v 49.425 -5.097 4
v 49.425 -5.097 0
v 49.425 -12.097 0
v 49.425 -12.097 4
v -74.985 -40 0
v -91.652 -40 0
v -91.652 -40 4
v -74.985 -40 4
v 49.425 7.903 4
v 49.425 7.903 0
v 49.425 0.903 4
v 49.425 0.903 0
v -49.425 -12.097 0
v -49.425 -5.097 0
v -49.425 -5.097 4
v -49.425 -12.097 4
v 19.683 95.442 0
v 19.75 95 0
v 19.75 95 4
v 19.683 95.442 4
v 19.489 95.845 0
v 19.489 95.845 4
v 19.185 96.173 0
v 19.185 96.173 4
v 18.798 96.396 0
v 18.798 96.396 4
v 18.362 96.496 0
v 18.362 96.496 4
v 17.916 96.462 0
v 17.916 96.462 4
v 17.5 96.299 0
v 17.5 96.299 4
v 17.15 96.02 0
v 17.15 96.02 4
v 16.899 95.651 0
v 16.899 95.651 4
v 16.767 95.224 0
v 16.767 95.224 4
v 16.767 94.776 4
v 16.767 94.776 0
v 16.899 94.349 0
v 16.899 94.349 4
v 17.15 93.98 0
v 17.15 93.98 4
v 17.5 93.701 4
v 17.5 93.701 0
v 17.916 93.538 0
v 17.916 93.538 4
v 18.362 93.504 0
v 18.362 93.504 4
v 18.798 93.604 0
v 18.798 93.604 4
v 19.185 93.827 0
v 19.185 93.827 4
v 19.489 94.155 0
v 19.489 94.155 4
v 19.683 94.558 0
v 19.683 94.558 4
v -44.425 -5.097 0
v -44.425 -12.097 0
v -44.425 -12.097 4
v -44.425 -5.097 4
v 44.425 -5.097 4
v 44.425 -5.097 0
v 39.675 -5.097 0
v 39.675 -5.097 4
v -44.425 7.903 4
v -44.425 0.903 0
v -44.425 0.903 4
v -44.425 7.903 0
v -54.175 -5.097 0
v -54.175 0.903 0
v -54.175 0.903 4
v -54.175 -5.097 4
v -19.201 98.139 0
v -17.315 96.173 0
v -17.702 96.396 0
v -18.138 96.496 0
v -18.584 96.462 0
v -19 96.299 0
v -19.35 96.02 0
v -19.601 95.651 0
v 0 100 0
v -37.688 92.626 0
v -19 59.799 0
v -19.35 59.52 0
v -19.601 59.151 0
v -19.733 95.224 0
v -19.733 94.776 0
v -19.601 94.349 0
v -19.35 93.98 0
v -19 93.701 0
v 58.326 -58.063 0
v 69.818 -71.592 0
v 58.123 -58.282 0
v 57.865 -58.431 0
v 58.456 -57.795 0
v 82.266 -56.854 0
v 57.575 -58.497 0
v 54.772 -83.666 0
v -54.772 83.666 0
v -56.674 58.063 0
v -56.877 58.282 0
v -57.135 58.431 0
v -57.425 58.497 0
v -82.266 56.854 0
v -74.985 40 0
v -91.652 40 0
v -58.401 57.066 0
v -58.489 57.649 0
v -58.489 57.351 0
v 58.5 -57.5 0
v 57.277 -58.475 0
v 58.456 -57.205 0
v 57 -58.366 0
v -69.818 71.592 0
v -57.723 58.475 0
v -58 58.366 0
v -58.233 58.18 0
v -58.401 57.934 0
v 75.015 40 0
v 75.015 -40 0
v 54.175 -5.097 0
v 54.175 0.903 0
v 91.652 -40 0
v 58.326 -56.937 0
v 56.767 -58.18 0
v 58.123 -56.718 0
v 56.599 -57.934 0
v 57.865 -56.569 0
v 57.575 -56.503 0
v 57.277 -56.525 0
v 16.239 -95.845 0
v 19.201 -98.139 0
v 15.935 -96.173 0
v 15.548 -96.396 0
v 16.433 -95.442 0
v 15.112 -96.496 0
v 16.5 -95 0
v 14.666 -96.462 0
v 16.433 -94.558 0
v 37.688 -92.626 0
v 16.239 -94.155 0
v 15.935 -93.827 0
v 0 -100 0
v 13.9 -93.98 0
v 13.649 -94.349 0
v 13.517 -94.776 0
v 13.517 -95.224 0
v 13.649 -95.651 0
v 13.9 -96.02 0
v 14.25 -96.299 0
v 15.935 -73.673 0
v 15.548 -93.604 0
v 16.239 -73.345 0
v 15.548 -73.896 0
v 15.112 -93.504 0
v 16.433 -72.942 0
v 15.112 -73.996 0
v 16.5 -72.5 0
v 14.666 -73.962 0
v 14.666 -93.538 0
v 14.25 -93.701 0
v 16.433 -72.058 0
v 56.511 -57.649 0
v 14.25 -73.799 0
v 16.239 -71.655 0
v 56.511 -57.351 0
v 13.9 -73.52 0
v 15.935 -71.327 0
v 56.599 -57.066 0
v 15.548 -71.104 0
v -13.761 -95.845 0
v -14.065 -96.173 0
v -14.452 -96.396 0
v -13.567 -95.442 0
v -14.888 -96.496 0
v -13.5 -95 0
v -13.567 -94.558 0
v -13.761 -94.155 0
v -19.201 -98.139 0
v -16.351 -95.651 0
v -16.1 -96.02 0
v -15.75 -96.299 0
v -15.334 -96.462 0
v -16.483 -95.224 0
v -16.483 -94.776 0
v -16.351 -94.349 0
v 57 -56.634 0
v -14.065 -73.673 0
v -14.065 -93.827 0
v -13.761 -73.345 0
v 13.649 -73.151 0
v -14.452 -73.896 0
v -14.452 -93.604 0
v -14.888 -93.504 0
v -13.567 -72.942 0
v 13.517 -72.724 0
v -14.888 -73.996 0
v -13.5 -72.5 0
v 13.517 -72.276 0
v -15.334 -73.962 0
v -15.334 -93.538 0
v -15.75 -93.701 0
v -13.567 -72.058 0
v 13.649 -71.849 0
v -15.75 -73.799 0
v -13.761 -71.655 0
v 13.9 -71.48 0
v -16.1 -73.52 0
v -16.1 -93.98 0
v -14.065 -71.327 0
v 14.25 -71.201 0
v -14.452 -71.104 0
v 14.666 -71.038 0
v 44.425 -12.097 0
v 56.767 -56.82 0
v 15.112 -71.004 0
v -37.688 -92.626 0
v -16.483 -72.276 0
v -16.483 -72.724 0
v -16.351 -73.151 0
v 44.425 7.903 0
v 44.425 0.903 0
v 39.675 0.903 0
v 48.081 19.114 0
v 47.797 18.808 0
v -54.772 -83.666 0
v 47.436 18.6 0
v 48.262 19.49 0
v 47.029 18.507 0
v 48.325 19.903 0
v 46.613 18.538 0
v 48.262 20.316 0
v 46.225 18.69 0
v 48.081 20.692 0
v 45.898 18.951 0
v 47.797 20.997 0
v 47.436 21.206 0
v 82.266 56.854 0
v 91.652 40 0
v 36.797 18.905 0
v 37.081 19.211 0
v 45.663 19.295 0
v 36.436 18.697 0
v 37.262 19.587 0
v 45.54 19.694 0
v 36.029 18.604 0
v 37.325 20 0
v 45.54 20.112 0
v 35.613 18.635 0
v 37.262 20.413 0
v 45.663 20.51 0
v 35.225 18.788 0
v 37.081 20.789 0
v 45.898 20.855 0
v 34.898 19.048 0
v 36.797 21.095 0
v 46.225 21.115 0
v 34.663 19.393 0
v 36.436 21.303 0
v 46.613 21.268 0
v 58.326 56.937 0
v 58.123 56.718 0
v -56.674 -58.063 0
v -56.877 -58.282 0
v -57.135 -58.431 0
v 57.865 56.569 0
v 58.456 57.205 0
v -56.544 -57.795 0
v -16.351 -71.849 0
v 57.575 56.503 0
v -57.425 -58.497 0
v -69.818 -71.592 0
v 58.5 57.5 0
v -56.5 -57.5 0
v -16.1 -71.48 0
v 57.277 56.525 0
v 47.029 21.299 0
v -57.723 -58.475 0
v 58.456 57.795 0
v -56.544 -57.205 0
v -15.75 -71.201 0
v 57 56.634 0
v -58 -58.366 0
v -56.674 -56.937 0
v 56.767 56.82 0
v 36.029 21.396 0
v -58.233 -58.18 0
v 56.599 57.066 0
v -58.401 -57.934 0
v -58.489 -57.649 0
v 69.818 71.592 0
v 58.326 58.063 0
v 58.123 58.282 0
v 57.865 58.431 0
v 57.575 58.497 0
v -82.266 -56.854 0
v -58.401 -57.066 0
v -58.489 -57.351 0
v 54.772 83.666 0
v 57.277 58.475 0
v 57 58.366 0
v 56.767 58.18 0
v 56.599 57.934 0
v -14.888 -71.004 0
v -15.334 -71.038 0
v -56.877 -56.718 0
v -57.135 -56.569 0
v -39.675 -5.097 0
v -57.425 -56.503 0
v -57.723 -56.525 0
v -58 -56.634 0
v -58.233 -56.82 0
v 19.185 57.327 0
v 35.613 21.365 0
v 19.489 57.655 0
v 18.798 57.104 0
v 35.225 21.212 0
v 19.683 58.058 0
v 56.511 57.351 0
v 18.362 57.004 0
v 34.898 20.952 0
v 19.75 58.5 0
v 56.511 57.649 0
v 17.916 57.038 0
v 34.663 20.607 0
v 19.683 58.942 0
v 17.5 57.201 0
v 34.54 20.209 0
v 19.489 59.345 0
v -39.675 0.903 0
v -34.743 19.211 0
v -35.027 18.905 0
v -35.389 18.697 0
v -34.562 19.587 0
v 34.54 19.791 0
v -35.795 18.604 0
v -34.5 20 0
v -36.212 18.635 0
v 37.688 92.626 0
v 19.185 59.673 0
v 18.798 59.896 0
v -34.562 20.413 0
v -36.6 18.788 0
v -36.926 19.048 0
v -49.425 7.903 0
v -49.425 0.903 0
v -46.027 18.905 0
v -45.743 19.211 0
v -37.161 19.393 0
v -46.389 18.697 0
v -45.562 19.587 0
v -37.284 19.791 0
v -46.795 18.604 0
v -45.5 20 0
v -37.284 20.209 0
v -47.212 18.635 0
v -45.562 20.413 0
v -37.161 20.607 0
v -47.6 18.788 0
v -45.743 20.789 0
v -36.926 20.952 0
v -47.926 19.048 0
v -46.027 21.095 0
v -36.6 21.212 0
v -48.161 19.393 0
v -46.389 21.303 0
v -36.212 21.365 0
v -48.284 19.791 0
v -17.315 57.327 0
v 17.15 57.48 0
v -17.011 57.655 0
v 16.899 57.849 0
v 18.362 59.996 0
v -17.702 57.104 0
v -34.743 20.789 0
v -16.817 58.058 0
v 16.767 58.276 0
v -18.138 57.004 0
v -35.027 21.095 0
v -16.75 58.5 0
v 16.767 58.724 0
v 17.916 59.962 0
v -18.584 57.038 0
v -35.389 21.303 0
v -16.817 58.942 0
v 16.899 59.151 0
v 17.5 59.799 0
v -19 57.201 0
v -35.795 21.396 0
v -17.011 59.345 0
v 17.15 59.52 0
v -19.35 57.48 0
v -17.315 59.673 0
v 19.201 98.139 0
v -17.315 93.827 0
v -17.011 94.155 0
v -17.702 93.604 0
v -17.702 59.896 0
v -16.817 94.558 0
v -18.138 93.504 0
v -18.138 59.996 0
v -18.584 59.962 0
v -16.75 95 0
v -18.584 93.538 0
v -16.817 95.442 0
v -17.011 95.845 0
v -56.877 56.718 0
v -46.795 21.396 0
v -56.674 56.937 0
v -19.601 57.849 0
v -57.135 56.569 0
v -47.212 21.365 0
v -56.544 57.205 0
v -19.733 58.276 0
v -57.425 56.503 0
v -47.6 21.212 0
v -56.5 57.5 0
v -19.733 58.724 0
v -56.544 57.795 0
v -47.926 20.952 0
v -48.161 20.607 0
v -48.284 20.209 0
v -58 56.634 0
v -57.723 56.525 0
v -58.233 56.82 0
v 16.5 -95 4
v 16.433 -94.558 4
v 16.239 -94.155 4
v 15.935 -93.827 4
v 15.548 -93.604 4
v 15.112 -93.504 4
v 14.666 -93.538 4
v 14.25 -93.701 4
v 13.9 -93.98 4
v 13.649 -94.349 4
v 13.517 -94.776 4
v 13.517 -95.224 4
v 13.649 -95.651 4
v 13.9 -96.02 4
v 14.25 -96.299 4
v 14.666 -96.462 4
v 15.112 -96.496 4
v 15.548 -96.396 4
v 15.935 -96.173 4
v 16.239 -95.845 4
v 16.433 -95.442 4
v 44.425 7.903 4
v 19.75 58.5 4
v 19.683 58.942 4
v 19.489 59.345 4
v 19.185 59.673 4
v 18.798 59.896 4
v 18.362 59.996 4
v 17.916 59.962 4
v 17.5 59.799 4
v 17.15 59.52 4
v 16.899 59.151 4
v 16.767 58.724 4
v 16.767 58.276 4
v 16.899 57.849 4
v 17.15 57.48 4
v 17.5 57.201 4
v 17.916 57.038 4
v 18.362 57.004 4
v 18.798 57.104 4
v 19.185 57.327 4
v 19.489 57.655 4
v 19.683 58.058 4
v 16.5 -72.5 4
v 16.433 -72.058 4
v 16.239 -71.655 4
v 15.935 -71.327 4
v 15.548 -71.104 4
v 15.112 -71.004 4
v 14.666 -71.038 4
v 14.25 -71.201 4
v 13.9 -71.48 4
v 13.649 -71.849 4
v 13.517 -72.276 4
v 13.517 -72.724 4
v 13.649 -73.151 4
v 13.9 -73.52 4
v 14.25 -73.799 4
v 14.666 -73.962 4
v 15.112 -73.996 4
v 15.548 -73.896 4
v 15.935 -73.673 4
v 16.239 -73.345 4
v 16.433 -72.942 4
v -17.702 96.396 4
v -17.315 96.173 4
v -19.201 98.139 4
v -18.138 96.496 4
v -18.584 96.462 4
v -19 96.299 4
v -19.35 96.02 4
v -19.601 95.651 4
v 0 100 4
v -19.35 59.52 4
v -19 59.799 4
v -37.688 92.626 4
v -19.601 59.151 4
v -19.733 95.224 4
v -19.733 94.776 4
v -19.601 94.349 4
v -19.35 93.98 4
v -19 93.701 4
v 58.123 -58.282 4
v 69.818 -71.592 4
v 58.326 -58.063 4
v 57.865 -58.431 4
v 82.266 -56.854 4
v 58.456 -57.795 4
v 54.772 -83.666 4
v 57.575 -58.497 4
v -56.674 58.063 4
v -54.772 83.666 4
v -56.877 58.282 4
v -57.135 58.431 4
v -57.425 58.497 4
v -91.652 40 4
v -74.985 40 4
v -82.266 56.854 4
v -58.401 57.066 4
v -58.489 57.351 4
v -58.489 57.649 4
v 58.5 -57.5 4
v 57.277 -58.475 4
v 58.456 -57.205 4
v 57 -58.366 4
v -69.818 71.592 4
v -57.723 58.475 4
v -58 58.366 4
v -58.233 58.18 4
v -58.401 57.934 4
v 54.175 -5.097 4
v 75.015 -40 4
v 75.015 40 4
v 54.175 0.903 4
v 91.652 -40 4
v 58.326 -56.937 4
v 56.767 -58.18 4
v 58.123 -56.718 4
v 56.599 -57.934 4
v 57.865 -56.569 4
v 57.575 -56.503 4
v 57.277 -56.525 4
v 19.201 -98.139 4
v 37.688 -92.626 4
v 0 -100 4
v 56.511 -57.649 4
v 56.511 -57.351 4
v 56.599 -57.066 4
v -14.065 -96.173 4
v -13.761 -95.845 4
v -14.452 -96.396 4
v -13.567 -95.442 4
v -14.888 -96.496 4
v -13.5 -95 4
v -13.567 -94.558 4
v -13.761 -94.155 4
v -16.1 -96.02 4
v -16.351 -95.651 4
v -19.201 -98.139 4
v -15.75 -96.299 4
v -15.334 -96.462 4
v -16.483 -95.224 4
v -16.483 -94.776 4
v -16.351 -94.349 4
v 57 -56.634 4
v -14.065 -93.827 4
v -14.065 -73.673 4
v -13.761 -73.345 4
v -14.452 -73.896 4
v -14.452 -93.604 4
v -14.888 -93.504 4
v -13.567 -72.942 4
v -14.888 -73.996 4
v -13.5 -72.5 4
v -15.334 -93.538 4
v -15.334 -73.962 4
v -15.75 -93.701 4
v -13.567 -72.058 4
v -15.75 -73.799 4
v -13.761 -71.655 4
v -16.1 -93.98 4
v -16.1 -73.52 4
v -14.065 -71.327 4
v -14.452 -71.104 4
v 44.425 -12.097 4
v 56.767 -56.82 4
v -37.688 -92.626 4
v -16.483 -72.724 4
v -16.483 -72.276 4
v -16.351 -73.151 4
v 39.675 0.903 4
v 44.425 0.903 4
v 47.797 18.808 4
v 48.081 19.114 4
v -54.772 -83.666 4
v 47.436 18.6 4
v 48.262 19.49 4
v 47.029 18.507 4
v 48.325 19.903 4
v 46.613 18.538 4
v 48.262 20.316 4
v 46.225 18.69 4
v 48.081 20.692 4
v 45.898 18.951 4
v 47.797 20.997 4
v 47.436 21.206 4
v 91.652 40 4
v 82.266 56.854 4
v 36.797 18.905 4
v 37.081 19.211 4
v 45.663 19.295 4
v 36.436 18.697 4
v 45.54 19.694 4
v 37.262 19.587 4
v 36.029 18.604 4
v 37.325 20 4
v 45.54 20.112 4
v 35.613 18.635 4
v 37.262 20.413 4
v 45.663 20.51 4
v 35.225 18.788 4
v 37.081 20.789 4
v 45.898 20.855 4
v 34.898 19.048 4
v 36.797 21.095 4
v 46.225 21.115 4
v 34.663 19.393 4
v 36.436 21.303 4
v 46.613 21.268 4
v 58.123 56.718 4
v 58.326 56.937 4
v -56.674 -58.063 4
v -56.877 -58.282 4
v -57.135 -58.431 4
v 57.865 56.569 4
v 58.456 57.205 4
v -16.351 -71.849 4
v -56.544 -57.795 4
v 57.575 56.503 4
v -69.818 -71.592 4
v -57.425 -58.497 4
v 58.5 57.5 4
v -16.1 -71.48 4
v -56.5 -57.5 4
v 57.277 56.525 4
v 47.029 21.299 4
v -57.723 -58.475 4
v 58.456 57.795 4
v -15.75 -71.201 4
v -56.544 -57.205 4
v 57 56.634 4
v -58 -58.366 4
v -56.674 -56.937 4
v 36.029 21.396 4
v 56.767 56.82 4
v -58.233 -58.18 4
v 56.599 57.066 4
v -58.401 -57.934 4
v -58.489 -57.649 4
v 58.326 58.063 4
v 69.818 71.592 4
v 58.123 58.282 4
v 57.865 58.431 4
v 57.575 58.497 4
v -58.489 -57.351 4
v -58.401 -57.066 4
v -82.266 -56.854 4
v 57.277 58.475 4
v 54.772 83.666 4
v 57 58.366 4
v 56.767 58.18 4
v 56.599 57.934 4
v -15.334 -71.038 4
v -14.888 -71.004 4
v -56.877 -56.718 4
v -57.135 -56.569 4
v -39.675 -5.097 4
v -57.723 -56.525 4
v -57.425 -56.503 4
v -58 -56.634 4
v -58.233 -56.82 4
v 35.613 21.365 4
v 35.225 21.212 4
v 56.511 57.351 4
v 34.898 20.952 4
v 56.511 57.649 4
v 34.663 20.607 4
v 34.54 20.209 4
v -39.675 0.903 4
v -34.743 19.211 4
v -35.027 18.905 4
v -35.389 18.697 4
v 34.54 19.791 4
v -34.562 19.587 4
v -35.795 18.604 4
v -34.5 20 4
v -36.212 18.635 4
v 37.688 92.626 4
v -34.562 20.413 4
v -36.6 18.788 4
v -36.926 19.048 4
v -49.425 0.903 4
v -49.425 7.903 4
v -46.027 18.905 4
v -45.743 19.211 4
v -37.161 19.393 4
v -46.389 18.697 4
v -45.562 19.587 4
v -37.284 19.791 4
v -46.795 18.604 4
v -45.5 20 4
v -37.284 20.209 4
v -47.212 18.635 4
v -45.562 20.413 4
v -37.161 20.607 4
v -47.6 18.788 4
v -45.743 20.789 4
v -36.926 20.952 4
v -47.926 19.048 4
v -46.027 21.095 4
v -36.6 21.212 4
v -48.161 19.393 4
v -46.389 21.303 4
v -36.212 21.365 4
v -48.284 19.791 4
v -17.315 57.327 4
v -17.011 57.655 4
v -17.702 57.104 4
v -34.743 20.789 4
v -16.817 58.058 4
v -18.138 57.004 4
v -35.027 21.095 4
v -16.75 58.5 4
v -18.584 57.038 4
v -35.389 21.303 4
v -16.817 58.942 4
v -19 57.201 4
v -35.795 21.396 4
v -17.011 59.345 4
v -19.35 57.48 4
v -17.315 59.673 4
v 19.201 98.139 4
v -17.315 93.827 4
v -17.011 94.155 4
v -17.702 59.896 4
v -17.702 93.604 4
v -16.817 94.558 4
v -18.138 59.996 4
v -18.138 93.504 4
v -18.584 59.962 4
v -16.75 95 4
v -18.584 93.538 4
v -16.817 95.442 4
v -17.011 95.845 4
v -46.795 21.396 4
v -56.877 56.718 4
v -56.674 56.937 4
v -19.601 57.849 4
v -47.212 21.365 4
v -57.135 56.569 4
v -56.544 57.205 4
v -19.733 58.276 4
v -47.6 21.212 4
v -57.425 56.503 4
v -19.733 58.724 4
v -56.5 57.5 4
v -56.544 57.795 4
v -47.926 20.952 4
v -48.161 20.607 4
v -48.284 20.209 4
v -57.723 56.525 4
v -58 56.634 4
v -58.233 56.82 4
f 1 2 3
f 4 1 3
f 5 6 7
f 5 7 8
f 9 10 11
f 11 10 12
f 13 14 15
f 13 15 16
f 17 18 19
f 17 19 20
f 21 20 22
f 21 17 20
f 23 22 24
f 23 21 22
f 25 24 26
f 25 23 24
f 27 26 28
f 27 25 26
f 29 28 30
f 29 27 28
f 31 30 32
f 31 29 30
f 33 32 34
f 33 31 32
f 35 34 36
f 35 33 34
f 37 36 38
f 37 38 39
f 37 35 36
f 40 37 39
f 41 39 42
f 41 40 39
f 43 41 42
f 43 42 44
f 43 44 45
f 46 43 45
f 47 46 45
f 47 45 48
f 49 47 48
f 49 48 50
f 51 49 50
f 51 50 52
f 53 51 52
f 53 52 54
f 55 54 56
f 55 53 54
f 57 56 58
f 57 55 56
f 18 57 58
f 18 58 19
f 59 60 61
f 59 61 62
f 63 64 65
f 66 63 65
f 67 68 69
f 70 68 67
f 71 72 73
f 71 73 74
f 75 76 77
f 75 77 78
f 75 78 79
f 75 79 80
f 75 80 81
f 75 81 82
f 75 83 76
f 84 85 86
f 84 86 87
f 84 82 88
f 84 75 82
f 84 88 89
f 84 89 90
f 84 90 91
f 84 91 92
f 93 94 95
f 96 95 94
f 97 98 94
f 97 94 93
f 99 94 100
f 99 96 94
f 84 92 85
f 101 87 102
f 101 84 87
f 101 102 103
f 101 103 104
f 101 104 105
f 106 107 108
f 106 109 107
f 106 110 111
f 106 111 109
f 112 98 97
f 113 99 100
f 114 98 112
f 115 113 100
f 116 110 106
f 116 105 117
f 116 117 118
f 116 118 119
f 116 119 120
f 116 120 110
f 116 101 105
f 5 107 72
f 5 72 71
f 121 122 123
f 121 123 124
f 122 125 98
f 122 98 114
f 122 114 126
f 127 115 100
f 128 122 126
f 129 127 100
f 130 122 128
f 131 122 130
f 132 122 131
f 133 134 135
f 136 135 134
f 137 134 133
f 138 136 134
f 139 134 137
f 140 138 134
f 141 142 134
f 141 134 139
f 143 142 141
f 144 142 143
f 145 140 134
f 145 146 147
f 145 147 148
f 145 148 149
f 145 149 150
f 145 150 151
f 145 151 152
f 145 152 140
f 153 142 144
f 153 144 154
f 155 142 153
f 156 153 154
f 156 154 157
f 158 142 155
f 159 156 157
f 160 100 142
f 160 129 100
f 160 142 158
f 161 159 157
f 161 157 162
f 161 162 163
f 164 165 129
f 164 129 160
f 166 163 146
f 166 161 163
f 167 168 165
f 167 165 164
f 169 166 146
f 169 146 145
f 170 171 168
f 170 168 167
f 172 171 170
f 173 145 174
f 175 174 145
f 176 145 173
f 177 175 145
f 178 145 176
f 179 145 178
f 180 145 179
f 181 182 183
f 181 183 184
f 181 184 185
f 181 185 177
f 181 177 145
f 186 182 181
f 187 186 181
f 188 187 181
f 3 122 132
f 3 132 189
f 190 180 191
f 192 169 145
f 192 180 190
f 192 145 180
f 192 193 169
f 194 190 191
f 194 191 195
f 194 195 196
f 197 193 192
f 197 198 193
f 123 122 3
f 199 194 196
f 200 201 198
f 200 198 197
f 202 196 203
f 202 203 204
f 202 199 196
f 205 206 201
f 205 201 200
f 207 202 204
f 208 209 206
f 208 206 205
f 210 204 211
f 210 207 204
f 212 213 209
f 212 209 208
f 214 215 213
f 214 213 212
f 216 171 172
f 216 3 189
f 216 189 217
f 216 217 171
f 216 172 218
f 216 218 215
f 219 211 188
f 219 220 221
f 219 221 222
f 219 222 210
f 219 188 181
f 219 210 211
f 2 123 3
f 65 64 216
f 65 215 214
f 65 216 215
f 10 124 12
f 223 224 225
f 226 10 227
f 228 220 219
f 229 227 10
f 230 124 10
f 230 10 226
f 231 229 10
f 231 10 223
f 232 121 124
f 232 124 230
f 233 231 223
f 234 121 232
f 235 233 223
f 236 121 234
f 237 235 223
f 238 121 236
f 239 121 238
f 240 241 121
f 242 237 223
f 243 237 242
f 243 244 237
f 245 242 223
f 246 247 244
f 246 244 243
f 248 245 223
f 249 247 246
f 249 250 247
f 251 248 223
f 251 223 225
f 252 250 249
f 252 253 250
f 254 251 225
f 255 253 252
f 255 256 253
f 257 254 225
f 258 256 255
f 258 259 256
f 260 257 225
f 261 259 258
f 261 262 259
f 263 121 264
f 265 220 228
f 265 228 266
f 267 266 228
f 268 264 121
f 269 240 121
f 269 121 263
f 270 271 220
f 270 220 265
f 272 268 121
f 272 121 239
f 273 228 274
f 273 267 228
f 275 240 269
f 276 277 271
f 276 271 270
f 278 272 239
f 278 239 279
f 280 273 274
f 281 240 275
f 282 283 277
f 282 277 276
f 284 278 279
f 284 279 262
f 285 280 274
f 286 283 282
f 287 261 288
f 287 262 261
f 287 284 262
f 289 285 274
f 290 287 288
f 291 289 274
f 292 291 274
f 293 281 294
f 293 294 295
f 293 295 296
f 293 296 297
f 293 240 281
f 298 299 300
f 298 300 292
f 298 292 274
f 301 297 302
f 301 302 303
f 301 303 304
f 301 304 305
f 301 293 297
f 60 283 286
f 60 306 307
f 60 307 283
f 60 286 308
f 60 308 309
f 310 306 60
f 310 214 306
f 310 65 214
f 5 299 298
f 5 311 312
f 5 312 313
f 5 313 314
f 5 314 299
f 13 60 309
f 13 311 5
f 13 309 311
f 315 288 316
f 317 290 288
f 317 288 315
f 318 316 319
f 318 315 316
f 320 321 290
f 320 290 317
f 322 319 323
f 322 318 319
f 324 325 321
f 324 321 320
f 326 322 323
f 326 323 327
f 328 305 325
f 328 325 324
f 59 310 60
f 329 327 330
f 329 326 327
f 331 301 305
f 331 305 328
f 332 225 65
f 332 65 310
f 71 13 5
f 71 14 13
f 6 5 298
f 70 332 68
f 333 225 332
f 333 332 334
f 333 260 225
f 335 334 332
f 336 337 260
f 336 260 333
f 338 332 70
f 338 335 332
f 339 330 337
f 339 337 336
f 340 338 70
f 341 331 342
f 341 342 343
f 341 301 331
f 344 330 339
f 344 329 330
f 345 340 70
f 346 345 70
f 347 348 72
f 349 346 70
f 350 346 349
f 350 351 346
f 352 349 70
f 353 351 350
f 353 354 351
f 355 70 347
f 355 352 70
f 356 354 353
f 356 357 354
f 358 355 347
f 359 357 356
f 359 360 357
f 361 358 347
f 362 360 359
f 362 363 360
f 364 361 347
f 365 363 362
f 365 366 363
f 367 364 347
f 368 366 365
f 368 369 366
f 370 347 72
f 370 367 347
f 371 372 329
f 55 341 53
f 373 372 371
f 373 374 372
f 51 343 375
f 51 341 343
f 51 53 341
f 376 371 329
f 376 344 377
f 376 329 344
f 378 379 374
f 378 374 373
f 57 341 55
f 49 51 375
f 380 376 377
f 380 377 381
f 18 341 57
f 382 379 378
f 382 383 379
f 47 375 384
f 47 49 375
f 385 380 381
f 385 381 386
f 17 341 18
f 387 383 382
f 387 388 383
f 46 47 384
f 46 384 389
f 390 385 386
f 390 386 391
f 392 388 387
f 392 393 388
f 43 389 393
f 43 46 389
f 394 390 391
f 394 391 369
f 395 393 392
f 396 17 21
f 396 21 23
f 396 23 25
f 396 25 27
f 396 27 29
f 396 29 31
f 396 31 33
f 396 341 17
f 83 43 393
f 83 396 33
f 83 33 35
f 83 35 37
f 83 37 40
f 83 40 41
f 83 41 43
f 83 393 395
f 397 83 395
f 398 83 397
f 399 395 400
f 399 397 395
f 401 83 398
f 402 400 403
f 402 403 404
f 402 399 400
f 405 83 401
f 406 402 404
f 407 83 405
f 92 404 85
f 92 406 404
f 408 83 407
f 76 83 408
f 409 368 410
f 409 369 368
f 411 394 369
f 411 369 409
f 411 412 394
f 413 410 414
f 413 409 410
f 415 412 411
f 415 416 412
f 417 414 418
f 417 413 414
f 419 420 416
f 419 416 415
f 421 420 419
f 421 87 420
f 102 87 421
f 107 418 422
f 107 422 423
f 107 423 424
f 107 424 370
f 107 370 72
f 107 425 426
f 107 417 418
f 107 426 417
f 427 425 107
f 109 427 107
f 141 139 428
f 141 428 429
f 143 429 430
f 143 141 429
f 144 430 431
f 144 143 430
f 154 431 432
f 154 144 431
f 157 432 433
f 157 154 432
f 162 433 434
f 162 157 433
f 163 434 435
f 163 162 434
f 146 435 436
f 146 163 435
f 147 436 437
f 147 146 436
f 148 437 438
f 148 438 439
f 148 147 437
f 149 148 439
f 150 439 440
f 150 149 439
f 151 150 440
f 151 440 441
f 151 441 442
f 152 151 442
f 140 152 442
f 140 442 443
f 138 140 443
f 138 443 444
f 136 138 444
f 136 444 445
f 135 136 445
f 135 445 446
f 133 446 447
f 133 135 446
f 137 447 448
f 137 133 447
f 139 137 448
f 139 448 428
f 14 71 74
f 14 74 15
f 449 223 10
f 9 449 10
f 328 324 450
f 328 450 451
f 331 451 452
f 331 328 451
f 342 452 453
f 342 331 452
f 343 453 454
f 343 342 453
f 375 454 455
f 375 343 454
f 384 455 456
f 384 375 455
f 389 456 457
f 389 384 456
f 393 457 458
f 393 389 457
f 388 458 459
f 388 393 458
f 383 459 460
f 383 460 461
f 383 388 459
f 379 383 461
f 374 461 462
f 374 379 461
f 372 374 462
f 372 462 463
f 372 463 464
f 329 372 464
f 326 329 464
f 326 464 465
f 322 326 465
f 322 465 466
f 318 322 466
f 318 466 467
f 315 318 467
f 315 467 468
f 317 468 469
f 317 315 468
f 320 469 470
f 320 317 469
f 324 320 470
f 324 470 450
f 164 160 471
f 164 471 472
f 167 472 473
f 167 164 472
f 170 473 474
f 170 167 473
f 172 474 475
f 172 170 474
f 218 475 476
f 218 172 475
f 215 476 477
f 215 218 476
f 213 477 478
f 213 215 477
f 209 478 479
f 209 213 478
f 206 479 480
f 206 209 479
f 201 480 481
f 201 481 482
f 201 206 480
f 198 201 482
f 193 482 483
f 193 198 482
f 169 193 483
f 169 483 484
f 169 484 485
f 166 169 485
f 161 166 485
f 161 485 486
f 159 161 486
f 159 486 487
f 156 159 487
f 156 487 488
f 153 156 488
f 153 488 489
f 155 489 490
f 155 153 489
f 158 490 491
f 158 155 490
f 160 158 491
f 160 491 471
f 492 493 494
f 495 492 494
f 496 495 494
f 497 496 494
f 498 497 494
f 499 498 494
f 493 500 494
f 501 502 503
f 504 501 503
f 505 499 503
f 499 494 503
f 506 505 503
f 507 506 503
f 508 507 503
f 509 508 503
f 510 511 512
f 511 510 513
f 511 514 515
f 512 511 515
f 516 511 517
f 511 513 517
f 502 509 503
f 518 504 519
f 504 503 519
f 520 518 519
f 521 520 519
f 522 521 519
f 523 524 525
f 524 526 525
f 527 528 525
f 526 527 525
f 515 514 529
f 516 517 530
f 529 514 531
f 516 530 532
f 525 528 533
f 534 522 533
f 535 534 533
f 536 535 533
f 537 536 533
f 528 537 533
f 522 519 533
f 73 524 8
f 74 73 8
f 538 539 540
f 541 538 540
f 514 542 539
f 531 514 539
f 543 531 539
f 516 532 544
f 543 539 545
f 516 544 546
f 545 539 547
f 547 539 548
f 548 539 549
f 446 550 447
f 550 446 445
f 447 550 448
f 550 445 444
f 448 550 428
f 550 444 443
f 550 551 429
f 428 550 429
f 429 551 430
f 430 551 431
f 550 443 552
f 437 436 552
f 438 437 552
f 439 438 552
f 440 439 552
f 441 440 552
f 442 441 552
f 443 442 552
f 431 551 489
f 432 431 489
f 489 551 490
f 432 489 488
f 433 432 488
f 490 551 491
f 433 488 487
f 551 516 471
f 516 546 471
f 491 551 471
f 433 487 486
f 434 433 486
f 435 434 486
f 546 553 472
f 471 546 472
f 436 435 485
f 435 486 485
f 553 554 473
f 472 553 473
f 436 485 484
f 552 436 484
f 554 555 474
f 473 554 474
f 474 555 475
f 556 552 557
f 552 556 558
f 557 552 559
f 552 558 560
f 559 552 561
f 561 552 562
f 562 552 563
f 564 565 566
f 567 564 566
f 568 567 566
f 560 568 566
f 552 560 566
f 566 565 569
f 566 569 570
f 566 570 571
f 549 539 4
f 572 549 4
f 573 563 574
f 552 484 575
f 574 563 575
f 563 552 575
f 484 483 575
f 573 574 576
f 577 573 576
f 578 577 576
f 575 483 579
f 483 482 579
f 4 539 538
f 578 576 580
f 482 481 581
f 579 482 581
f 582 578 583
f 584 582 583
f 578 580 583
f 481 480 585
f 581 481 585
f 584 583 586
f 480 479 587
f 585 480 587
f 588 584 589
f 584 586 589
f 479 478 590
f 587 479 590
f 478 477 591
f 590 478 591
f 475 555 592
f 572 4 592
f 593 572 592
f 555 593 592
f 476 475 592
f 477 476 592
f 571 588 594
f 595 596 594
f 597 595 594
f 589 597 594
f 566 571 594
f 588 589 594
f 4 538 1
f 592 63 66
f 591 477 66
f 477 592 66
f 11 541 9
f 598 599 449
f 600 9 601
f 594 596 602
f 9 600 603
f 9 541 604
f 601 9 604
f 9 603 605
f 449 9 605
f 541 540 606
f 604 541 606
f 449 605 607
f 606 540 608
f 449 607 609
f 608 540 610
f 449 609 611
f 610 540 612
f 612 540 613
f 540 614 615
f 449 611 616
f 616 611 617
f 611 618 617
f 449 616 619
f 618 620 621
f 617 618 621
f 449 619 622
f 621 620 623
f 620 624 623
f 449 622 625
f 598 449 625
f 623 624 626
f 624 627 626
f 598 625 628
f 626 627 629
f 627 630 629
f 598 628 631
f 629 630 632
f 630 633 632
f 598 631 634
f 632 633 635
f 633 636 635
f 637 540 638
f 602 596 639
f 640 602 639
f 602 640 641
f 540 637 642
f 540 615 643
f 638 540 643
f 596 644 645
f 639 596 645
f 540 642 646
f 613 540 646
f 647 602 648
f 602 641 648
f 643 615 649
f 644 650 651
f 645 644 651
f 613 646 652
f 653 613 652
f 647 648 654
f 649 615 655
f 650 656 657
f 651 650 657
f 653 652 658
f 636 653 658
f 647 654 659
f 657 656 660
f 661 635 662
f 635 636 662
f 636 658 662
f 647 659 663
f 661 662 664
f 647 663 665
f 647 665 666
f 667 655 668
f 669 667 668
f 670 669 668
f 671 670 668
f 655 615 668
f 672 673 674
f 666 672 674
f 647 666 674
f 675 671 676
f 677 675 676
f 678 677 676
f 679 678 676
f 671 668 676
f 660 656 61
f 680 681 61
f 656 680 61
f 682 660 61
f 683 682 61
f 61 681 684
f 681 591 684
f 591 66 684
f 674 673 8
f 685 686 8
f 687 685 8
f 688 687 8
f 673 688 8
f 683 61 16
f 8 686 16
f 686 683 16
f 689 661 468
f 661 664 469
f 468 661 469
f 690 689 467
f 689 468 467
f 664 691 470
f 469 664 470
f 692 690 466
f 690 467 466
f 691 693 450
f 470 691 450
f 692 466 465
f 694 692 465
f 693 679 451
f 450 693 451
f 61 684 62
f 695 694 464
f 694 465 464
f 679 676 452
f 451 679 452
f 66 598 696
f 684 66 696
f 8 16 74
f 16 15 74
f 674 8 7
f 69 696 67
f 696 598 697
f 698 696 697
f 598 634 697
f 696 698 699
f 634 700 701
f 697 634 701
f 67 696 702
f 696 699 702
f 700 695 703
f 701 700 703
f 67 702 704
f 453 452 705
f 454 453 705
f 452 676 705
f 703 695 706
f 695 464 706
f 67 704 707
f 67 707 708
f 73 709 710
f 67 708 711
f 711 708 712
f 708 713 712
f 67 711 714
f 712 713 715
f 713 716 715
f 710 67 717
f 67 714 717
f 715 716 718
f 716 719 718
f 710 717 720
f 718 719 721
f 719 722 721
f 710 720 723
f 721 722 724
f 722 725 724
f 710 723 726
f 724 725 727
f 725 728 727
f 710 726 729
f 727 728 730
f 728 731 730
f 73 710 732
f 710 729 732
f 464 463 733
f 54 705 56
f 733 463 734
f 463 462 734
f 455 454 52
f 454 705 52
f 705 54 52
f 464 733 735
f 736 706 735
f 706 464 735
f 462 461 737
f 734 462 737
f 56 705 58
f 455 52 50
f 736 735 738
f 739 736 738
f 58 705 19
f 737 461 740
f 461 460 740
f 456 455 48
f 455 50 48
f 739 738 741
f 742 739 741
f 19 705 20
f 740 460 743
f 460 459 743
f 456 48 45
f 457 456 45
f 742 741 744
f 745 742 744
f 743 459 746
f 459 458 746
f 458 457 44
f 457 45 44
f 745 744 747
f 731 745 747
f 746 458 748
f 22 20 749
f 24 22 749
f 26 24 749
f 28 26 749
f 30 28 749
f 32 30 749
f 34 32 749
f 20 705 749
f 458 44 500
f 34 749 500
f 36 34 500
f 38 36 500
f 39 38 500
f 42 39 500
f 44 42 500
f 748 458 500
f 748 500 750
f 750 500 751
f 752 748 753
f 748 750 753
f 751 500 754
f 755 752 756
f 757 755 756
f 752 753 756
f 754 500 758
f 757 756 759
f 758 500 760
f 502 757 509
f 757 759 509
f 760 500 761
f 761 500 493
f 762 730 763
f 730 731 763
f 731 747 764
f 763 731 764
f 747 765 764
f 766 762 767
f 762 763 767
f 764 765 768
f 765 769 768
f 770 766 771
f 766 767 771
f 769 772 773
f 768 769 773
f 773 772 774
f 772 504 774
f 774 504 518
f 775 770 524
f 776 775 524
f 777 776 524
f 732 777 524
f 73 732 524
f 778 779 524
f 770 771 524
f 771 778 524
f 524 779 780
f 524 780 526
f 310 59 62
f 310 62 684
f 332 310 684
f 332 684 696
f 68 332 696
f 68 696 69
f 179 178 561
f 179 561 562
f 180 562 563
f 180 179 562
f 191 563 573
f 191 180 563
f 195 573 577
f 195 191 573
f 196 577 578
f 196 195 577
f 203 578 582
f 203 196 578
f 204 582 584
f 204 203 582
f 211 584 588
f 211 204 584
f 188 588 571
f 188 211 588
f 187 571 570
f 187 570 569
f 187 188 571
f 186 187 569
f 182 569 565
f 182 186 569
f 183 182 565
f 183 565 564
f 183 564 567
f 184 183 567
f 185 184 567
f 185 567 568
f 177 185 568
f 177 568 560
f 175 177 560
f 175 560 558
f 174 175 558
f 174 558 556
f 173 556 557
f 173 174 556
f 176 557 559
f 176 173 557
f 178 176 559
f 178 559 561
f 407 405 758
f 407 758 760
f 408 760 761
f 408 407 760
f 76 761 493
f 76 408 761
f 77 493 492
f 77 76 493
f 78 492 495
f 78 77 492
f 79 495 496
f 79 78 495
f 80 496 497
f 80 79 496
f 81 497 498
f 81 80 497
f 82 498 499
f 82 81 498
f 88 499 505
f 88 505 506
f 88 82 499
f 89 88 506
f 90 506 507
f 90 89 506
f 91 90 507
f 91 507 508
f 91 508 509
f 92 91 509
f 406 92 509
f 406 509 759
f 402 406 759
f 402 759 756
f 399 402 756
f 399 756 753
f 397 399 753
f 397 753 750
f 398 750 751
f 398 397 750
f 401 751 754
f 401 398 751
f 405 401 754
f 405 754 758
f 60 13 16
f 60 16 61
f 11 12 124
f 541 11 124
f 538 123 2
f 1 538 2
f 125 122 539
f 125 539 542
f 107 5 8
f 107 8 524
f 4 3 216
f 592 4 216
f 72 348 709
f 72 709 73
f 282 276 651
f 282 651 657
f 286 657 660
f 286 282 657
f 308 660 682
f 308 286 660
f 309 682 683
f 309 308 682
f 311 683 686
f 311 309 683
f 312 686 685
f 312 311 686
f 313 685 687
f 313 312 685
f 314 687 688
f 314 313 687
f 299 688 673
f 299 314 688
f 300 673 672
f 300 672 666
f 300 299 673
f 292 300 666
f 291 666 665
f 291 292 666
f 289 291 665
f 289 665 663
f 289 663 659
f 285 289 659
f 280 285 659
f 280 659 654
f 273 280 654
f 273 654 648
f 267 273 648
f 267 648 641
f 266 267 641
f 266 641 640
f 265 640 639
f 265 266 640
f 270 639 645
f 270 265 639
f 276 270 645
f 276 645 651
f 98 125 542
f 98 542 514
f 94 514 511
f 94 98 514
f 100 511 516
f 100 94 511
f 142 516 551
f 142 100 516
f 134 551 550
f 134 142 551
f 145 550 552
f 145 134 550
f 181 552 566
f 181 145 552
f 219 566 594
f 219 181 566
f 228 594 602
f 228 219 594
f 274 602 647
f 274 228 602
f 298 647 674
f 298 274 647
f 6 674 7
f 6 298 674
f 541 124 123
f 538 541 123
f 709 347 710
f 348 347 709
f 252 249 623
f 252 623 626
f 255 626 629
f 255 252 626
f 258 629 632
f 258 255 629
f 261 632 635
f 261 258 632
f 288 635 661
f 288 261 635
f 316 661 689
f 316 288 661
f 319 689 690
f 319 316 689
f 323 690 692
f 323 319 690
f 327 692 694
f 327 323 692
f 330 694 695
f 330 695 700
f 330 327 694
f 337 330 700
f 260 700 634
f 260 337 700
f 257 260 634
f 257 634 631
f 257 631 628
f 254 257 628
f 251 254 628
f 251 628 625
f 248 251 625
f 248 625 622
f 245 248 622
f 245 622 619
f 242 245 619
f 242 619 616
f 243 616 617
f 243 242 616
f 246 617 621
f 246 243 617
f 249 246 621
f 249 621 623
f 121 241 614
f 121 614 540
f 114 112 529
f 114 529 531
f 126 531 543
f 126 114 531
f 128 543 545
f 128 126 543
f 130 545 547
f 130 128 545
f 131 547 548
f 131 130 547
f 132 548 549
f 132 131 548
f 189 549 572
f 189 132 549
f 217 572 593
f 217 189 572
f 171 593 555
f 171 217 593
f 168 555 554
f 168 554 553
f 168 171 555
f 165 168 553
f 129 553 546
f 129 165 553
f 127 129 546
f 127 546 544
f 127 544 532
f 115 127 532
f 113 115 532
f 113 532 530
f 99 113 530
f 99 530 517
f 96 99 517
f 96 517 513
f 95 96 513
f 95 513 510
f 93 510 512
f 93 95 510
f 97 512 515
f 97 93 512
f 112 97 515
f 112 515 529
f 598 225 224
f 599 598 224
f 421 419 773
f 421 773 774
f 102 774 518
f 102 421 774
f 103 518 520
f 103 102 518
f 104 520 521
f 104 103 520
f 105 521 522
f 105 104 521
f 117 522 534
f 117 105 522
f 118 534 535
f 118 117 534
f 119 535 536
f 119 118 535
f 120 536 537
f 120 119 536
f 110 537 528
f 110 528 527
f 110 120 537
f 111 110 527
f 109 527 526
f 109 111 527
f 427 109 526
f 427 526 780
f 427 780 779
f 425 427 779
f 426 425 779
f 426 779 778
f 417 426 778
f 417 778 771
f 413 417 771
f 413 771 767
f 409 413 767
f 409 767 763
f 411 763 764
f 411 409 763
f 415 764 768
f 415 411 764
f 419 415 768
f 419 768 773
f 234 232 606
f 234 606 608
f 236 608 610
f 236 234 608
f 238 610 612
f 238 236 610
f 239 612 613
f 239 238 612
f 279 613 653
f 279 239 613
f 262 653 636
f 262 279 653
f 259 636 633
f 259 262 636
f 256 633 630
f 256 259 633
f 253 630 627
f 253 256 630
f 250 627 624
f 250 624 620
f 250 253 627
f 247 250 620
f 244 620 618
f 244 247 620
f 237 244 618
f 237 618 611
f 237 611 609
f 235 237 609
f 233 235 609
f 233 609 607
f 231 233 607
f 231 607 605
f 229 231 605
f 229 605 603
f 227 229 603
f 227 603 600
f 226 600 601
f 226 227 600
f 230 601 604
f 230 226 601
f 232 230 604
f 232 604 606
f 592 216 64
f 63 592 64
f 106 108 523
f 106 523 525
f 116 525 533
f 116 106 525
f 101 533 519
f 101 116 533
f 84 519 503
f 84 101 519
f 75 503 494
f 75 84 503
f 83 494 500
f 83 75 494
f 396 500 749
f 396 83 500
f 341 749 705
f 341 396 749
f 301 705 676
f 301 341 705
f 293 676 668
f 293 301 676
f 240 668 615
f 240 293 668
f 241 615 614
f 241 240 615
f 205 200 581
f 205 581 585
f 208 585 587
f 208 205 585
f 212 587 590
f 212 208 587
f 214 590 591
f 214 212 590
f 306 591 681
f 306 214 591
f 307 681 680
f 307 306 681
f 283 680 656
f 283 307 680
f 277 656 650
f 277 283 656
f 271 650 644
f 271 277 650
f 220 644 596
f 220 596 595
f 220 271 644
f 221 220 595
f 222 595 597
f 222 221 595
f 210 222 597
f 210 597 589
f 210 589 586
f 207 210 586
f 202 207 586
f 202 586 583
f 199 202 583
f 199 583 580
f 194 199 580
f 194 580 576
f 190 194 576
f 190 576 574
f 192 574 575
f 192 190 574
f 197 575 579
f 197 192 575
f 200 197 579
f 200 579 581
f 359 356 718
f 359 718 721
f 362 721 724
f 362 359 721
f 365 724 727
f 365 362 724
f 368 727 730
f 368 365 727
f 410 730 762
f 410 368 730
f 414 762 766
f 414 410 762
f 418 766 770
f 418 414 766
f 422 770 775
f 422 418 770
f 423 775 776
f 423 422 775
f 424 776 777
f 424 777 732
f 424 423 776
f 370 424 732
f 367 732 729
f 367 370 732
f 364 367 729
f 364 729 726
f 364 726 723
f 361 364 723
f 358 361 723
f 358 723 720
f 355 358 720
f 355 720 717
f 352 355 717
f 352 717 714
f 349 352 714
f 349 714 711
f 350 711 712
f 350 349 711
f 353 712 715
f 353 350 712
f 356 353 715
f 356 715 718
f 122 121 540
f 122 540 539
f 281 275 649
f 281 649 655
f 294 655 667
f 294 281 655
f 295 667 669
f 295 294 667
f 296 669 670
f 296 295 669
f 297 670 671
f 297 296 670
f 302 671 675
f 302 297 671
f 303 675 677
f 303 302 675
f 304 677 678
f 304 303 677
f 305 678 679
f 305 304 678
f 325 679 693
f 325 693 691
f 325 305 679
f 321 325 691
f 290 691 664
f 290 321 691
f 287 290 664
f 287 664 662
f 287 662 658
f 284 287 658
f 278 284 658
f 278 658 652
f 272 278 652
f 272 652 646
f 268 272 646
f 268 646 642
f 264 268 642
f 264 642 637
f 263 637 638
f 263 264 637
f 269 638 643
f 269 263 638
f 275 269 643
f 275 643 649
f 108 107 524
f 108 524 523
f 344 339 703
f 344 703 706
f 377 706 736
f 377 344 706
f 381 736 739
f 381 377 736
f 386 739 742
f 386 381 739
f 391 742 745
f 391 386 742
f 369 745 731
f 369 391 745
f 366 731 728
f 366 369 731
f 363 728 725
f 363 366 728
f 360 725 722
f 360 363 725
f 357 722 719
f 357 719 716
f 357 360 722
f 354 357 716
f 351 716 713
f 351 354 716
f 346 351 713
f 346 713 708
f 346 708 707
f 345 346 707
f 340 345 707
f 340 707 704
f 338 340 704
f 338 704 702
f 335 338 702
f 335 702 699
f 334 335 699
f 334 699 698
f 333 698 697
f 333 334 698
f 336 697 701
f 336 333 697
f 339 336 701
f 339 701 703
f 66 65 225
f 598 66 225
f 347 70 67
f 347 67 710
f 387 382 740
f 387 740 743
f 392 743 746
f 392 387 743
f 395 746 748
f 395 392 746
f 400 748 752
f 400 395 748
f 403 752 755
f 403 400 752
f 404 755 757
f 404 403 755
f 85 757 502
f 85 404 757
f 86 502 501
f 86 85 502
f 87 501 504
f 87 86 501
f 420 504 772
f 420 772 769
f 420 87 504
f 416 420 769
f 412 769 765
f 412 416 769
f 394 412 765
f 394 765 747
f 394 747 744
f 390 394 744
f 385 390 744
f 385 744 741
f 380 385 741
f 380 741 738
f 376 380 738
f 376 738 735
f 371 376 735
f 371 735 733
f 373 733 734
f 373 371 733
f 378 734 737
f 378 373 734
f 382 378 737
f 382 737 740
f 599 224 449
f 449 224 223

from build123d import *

# Parameters (mm, degrees)
ESBO_O1_R                = 1
ESBO_O1_R_2              = 1.4
ESBO_O1_R_3              = 1.5
RESSALTO_EXTRUS_O2_DEPTH = 4


with BuildPart() as part:
    # Esboço1 → Ressalto-extrusão2 (new body)
    with BuildSketch(Plane.XY):
        with BuildLine():
            Line((75.01453416, -40), (91.651513899, -40))
            ThreePointArc((91.651513899, -40), (0, -100), (-91.651513899, -40))
            Line((-91.651513899, -40), (-74.98546584, -40))
            Line((-74.98546584, -40), (-74.98546584, 40))
            Line((-74.98546584, 40), (-91.651513899, 40))
            ThreePointArc((-91.651513899, 40), (0, 100), (91.651513899, 40))
            Line((91.651513899, 40), (75.01453416, 40))
            Line((75.01453416, 40), (75.01453416, -40))
        make_face()
        with Locations((-57.5, 57.5)):
            Circle(ESBO_O1_R, mode=Mode.SUBTRACT)
        with Locations((57.5, 57.5)):
            Circle(ESBO_O1_R, mode=Mode.SUBTRACT)
        with Locations((57.5, -57.5)):
            Circle(ESBO_O1_R, mode=Mode.SUBTRACT)
        with Locations((-57.5, -57.5)):
            Circle(ESBO_O1_R, mode=Mode.SUBTRACT)
        with Locations((-46.9, 20)):
            Circle(ESBO_O1_R_2, mode=Mode.SUBTRACT)
        with Locations((46.92453416, 19.902879261)):
            Circle(ESBO_O1_R_2, mode=Mode.SUBTRACT)
        with Locations((-18.25, 95)):
            Circle(ESBO_O1_R_3, mode=Mode.SUBTRACT)
        with Locations((18.25, 95)):
            Circle(ESBO_O1_R_3, mode=Mode.SUBTRACT)
        with Locations((18.25, 58.5)):
            Circle(ESBO_O1_R_3, mode=Mode.SUBTRACT)
        with Locations((-18.25, 58.5)):
            Circle(ESBO_O1_R_3, mode=Mode.SUBTRACT)
        with Locations((-15, -95)):
            Circle(ESBO_O1_R_3, mode=Mode.SUBTRACT)
        with Locations((15, -95)):
            Circle(ESBO_O1_R_3, mode=Mode.SUBTRACT)
        with Locations((15, -72.5)):
            Circle(ESBO_O1_R_3, mode=Mode.SUBTRACT)
        with Locations((-15, -72.5)):
            Circle(ESBO_O1_R_3, mode=Mode.SUBTRACT)
        with Locations((-35.9, 20)):
            Circle(ESBO_O1_R_2, mode=Mode.SUBTRACT)
        with Locations((35.92453416, 20)):
            Circle(ESBO_O1_R_2, mode=Mode.SUBTRACT)
        Polygon((49.42453416, -5.097120739), (49.42453416, -12.097120739), (44.42453416, -12.097120739), (44.42453416, -5.097120739), (39.67453416, -5.097120739), (39.67453416, 0.902879261), (44.42453416, 0.902879261), (44.42453416, 7.902879261), (49.42453416, 7.902879261), (49.42453416, 0.902879261), (54.17453416, 0.902879261), (54.17453416, -5.097120739), align=None, mode=Mode.SUBTRACT)
        Polygon((-54.17453416, 0.902879261), (-54.17453416, -5.097120739), (-49.42453416, -5.097120739), (-49.42453416, -12.097120739), (-44.42453416, -12.097120739), (-44.42453416, -5.097120739), (-39.67453416, -5.097120739), (-39.67453416, 0.902879261), (-44.42453416, 0.902879261), (-44.42453416, 7.902879261), (-49.42453416, 7.902879261), (-49.42453416, 0.902879261), align=None, mode=Mode.SUBTRACT)
    extrude(amount=RESSALTO_EXTRUS_O2_DEPTH)


solid = part.part
